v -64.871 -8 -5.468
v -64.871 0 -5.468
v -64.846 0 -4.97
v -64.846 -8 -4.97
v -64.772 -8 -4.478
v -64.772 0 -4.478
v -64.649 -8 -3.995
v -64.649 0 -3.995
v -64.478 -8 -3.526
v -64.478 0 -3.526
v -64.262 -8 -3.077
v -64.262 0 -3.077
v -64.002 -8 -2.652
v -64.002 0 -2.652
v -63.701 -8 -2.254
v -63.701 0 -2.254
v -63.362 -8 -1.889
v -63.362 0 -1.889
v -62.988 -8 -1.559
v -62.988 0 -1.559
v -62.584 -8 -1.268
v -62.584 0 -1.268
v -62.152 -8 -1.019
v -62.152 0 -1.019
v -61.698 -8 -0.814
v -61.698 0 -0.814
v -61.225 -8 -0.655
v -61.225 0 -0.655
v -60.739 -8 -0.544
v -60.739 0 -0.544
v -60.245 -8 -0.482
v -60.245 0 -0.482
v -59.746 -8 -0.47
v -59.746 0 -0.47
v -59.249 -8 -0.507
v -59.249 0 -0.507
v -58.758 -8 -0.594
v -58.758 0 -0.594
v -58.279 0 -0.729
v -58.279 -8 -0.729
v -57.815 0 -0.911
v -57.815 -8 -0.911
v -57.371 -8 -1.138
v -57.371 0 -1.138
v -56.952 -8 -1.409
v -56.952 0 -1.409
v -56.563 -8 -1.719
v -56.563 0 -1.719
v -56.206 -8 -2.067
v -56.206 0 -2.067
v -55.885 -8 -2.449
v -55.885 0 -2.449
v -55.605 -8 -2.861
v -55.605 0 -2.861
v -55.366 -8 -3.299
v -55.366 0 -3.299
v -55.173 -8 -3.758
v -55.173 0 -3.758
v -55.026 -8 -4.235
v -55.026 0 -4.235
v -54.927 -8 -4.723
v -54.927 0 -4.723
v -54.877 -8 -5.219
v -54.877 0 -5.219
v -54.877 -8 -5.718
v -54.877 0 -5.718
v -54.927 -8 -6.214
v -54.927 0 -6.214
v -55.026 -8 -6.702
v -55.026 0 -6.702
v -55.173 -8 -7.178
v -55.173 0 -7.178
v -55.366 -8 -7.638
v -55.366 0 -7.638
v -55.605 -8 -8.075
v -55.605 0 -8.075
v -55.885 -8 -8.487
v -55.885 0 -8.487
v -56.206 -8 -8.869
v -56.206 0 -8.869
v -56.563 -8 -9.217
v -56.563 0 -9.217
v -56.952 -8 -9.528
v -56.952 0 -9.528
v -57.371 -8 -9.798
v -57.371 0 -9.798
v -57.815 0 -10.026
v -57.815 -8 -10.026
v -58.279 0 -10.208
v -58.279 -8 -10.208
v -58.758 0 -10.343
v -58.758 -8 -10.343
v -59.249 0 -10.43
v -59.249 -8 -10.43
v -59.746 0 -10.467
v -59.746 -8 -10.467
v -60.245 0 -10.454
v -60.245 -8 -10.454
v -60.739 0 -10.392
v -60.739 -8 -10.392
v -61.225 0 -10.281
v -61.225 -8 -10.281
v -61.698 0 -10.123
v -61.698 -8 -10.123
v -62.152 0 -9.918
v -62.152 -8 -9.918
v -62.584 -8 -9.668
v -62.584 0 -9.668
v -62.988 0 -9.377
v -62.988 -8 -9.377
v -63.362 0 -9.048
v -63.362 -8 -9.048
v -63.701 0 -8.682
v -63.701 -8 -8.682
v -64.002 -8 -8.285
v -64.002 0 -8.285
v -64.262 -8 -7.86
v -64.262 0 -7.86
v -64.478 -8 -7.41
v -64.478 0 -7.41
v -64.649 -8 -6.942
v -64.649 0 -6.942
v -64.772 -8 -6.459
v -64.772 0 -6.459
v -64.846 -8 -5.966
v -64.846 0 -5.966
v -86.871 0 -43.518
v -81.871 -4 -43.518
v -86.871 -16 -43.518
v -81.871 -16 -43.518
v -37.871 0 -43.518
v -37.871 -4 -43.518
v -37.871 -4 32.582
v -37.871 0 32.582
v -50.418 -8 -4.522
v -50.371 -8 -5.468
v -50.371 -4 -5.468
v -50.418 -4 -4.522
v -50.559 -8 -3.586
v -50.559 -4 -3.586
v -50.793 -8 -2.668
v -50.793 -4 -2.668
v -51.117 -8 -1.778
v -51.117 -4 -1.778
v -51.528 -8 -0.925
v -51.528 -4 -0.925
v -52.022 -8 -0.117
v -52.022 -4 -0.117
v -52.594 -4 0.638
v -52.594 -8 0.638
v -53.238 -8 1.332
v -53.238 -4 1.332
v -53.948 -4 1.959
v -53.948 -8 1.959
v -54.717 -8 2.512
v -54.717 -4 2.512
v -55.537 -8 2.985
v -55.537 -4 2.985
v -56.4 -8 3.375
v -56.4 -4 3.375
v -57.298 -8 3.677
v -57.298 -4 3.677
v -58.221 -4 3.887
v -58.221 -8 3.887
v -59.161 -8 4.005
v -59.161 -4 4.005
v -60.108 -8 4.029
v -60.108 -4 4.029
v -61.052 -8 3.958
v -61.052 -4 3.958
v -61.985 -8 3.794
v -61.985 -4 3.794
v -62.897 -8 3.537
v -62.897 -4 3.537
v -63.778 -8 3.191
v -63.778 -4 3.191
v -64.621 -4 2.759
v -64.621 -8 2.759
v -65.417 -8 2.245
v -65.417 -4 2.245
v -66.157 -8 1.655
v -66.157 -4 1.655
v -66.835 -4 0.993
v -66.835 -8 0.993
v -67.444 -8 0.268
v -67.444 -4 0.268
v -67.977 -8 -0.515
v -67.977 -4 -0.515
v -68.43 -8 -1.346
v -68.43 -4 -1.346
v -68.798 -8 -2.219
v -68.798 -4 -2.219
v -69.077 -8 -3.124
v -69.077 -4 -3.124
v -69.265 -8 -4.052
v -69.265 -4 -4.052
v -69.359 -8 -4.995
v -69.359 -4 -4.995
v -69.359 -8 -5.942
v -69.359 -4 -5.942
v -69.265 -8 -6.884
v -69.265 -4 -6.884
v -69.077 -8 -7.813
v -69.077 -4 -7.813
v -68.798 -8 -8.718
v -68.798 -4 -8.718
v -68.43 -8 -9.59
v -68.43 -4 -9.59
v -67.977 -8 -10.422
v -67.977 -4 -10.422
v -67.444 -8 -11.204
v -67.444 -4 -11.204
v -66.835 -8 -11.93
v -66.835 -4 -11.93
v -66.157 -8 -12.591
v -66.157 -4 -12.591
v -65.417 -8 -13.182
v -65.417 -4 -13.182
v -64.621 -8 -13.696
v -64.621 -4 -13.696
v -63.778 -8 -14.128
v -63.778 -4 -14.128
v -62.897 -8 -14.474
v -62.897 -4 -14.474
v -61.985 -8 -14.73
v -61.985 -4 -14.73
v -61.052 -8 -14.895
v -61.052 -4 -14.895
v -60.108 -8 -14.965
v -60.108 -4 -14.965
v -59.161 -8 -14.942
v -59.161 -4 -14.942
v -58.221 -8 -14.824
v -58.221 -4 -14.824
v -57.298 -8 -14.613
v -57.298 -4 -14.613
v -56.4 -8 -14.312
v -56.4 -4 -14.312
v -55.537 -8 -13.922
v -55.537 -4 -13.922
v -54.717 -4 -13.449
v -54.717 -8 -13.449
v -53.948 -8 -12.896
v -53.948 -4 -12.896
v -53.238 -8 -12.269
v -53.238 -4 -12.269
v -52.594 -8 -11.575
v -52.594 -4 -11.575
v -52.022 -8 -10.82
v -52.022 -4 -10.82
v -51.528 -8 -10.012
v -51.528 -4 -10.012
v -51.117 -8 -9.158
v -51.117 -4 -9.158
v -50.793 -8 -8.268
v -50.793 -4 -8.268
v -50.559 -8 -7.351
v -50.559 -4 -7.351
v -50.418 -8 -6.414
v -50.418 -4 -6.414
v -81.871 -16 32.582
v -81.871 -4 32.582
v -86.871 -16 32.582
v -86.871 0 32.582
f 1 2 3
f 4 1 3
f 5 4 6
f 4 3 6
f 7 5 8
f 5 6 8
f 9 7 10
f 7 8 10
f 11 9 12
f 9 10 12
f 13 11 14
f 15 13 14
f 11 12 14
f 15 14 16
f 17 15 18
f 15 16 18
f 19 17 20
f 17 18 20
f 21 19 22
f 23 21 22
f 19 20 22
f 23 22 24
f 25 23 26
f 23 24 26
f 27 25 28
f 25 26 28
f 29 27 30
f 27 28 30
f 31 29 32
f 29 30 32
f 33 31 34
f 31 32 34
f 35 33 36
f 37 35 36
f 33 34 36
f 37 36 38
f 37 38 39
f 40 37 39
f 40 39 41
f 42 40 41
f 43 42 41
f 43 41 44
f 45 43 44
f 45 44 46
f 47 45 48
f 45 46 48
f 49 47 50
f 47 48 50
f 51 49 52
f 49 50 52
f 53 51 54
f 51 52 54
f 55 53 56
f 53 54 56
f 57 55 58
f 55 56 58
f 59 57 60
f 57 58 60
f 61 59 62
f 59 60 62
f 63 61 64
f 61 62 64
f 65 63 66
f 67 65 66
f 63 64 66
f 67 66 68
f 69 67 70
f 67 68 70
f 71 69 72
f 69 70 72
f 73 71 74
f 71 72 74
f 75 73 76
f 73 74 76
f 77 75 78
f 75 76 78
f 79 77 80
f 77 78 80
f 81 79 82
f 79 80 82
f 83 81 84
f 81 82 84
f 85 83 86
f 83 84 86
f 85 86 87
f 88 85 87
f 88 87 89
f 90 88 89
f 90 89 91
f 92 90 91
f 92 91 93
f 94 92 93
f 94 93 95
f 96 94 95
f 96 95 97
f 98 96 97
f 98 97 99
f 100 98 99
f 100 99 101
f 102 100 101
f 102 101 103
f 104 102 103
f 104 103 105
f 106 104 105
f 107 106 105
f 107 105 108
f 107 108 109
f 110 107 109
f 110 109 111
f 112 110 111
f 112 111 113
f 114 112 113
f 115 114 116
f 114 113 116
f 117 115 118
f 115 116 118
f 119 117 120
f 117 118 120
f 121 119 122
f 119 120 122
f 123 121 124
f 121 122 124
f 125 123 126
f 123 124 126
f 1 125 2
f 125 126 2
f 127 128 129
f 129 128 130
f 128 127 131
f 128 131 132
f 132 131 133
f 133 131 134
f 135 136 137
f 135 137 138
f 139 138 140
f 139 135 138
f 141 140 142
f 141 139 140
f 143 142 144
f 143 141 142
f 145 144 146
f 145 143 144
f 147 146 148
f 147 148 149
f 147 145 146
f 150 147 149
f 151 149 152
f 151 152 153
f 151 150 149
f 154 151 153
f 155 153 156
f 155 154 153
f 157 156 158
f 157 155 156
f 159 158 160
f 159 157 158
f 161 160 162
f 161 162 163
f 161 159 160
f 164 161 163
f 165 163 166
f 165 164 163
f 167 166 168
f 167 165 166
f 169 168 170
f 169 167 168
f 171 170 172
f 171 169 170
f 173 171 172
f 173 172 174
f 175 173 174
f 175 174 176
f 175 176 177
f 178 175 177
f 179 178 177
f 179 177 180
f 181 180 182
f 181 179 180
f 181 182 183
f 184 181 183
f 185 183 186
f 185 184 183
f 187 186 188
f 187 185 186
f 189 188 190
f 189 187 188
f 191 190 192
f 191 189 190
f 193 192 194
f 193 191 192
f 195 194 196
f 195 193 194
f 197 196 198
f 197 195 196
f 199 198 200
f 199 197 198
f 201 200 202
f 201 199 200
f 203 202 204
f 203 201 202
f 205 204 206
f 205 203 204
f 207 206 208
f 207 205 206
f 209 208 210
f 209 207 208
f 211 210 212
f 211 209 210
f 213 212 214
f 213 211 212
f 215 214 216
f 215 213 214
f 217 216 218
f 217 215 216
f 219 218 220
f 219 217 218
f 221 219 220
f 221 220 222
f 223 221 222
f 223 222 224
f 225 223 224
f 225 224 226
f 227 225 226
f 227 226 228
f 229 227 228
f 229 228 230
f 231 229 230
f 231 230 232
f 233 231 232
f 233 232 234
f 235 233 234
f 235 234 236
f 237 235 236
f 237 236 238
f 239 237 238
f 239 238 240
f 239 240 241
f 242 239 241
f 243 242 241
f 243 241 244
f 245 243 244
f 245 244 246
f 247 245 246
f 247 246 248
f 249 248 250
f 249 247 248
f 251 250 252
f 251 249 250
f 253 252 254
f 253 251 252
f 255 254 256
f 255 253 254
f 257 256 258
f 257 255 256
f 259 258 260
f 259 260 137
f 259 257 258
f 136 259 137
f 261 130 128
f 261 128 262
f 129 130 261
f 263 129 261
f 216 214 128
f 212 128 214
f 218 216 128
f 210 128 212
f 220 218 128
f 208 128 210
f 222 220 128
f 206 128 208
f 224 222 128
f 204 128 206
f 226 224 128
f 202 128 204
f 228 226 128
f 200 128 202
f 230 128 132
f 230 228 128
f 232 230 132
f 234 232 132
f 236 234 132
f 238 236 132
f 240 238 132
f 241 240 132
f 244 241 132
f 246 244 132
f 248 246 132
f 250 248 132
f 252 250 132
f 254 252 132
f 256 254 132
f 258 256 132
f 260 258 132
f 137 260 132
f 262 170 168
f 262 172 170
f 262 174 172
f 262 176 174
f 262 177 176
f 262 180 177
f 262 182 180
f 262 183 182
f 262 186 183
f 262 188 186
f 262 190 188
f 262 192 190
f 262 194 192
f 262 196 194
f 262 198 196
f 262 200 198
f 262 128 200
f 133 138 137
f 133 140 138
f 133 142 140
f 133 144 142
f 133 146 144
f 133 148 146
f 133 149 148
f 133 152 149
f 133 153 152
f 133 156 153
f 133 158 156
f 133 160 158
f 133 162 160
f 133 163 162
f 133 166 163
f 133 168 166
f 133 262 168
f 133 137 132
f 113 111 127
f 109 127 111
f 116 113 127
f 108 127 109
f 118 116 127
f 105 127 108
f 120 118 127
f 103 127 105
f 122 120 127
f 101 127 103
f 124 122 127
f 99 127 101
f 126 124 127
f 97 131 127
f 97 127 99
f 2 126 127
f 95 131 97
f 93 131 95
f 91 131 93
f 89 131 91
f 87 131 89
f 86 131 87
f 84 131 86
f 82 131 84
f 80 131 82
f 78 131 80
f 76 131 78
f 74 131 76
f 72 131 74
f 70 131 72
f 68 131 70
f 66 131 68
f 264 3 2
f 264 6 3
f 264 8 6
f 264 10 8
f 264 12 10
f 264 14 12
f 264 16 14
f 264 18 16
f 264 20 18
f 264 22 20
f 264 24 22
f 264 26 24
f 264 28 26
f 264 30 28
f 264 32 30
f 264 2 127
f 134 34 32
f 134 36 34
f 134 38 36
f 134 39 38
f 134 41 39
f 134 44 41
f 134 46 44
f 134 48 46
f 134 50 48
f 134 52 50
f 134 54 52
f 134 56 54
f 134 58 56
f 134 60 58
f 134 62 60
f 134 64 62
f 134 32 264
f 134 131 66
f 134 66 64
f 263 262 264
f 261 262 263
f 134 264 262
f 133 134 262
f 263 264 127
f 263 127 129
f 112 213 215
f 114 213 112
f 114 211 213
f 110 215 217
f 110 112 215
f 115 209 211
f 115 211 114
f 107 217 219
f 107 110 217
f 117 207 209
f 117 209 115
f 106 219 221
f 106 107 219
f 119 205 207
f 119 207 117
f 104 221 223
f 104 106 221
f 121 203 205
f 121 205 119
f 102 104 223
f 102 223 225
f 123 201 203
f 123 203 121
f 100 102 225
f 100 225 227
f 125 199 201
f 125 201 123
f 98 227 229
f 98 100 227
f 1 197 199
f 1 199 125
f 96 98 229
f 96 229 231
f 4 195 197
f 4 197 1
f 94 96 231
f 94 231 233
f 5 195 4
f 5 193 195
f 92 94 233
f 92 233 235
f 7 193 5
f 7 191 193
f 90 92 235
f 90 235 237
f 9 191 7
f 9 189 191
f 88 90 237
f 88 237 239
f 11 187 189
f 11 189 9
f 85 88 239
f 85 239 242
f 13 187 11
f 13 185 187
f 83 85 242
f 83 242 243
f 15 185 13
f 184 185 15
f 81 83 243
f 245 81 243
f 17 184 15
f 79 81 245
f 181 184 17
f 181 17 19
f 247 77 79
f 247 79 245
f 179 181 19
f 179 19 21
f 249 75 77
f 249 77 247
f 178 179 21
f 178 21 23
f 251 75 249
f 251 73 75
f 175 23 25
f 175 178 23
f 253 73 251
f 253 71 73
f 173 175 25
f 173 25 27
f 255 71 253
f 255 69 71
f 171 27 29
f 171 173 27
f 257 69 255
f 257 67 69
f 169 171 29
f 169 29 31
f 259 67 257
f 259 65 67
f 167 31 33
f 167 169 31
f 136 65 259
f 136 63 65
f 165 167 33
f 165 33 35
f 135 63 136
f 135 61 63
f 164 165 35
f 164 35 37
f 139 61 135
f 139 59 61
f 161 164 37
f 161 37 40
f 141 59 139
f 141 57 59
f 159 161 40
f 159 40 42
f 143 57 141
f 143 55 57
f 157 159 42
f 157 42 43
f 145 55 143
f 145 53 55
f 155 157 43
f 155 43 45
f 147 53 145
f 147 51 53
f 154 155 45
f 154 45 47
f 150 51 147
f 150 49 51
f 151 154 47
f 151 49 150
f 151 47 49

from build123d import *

# Parameters (mm, degrees)
F1_DEPTH = 8
F2_W     = 16
F2_H     = 76.1
F3_DEPTH = 5
F4_W     = 44
F4_H     = 76.1
F4_R     = 9.5
F5_DEPTH = 4


with BuildPart() as f1:
    # F0 (on Front) → F1 (new body)
    with BuildSketch(Plane.XZ):
        with BuildLine():
            ThreePointArc((-54.871013, -5.46831), (-59.871013, -0.46831), (-64.871013, -5.46831))
            ThreePointArc((-64.871013, -5.46831), (-59.871013, -10.46831), (-54.871013, -5.46831))
        make_face()
        Polygon((-37.871013, 32.58169), (-81.871013, 32.58169), (-81.871013, -5.46831), (-81.871013, -43.51831), (-37.871013, -43.51831), align=None)
        with BuildLine():
            ThreePointArc((-54.871013, -5.46831), (-59.871013, -10.46831), (-64.871013, -5.46831))
            ThreePointArc((-64.871013, -5.46831), (-59.871013, -0.46831), (-54.871013, -5.46831))
        make_face(mode=Mode.SUBTRACT)
    extrude(amount=F1_DEPTH)

    # F2 (on face) → F3 (join)
    with BuildSketch(Plane(origin=(-81.871013, 0, 0), x_dir=(0, -1, 0), z_dir=(-1, 0, 0))):
        with Locations((8, -5.46831)):
            Rectangle(F2_W, F2_H)
    extrude(amount=F3_DEPTH)

    # F4 (on face) → F5 (cut)
    with BuildSketch(Plane.XZ.offset(8)):
        with Locations((-59.871013, -5.46831)):
            Rectangle(F4_W, F4_H)
        with Locations((-59.871013, -5.46831)):
            Circle(F4_R, mode=Mode.SUBTRACT)
    extrude(amount=-F5_DEPTH, mode=Mode.SUBTRACT)


solid = f1.part
